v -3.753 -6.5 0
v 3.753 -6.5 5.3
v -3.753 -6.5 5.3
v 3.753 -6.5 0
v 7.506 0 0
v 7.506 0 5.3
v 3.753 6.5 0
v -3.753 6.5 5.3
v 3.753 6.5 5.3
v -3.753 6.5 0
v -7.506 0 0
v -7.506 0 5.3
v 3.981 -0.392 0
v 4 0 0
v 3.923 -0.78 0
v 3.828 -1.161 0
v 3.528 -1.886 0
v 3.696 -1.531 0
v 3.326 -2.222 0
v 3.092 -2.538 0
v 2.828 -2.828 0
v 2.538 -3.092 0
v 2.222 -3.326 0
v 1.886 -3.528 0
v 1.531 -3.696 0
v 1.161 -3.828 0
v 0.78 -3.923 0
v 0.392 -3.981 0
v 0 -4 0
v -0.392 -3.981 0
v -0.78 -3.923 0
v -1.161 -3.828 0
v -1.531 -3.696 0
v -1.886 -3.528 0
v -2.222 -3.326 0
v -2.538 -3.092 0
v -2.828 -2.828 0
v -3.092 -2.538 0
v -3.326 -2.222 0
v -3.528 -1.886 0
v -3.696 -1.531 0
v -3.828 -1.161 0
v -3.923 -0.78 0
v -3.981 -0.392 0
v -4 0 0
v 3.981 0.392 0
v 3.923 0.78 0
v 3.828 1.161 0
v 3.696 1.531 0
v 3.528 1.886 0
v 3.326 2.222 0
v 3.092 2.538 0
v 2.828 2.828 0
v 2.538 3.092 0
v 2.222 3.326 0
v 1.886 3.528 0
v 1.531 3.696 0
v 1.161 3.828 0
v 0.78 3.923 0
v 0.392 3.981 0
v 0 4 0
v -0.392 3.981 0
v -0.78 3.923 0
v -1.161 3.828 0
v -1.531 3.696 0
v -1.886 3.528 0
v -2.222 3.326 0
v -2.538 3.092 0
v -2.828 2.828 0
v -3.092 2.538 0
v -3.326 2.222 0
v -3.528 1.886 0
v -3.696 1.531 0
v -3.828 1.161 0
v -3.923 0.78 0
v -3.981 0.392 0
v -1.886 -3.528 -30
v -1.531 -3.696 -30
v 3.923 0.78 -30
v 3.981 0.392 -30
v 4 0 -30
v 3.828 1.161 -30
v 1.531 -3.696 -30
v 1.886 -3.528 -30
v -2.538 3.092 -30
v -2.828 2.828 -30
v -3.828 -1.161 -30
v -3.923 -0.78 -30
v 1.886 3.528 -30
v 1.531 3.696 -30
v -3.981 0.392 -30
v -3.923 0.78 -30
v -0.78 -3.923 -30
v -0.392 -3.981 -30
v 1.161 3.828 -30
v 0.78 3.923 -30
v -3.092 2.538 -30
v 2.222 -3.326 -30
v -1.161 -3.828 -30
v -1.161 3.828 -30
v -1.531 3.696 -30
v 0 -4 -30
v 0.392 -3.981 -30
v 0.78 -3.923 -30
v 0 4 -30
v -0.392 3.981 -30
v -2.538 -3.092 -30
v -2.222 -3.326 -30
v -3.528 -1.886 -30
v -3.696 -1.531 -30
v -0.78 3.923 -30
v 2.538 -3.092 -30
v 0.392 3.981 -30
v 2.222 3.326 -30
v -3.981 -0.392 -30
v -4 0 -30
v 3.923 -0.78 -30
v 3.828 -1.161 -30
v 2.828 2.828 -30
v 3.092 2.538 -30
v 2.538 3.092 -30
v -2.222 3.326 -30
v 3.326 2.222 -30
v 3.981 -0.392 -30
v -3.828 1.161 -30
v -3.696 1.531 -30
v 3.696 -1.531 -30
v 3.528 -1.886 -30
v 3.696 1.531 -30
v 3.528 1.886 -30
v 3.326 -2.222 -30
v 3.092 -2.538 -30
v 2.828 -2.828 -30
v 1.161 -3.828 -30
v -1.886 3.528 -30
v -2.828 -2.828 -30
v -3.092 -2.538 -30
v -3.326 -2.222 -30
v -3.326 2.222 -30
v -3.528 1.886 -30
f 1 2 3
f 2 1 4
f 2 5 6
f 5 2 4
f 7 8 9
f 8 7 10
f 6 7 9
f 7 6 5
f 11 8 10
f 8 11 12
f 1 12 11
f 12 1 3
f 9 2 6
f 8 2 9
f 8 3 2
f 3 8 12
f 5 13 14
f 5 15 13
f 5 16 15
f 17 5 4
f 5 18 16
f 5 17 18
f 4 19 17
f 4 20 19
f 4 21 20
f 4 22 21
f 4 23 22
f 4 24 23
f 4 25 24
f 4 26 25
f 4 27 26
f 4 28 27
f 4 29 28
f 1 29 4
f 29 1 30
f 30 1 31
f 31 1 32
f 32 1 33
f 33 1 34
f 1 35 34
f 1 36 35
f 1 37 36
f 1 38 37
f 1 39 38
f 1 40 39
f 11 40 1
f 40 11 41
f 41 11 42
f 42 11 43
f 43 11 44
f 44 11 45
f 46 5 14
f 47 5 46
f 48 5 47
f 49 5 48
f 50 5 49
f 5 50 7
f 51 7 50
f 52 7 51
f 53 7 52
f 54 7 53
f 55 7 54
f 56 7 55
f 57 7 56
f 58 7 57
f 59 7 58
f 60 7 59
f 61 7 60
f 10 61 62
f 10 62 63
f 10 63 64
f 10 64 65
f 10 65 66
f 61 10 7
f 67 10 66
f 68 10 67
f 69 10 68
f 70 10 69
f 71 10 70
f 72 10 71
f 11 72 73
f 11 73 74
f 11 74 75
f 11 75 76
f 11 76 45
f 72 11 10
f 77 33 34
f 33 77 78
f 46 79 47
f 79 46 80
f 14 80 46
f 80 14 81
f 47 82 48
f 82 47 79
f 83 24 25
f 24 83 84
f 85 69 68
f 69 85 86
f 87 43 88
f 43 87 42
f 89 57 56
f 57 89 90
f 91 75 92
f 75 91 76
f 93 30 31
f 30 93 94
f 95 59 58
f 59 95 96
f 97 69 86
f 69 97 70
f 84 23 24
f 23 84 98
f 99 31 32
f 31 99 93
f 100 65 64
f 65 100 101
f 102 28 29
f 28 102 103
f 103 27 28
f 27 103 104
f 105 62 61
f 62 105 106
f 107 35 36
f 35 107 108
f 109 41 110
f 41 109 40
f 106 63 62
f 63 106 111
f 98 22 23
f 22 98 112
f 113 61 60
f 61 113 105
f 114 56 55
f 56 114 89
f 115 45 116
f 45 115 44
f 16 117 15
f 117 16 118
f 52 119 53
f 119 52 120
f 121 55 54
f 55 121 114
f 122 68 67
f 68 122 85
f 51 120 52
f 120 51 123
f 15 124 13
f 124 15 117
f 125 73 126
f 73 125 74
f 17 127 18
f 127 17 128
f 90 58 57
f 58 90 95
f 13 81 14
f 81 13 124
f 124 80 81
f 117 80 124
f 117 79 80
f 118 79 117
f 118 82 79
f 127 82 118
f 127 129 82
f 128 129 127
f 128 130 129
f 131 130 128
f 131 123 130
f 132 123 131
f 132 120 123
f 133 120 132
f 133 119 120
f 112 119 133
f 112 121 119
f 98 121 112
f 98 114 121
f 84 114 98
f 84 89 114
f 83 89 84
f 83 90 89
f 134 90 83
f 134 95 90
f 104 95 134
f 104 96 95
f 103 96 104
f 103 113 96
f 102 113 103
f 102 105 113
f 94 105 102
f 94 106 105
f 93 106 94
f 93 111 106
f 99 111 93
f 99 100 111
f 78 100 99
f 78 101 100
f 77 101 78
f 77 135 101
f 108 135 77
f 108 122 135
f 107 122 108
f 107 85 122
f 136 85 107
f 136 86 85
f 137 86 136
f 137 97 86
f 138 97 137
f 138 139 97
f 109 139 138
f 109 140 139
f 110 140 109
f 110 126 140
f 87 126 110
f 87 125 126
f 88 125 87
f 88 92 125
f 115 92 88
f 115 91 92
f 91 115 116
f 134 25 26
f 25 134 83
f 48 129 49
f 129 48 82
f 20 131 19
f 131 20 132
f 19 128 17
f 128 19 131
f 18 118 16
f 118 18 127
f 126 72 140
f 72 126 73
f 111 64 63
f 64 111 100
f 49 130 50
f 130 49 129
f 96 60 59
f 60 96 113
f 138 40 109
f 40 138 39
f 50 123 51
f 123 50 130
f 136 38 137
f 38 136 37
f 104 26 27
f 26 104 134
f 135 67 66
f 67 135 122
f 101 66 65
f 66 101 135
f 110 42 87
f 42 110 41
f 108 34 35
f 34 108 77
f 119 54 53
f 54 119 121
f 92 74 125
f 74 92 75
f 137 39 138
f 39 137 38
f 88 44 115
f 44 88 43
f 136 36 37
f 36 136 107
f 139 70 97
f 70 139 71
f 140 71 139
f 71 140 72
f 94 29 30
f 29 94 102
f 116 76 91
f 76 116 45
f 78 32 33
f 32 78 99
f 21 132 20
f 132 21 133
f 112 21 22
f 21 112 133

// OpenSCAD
// M8 Hex Bolt Parameters
across_flats = 13;
head_height = 5.3;
shank_diameter = 8;
shank_length = 30;

// Calculate the circumradius of the hexagon from the across-flats distance
// r = s / (2 * cos(30°)) = s / sqrt(3)
head_radius = across_flats / sqrt(3);

$fn = 64;

union() {
    // Head: Hexagonal prism
    // Positioned such that the bottom face is at z=0
    cylinder(h = head_height, r = head_radius, $fn = 6);

    // Shank: Cylindrical shaft
    // Extends from z=0 down to z = -shank_length
    translate([0, 0, -shank_length])
    cylinder(h = shank_length, d = shank_diameter);
}
